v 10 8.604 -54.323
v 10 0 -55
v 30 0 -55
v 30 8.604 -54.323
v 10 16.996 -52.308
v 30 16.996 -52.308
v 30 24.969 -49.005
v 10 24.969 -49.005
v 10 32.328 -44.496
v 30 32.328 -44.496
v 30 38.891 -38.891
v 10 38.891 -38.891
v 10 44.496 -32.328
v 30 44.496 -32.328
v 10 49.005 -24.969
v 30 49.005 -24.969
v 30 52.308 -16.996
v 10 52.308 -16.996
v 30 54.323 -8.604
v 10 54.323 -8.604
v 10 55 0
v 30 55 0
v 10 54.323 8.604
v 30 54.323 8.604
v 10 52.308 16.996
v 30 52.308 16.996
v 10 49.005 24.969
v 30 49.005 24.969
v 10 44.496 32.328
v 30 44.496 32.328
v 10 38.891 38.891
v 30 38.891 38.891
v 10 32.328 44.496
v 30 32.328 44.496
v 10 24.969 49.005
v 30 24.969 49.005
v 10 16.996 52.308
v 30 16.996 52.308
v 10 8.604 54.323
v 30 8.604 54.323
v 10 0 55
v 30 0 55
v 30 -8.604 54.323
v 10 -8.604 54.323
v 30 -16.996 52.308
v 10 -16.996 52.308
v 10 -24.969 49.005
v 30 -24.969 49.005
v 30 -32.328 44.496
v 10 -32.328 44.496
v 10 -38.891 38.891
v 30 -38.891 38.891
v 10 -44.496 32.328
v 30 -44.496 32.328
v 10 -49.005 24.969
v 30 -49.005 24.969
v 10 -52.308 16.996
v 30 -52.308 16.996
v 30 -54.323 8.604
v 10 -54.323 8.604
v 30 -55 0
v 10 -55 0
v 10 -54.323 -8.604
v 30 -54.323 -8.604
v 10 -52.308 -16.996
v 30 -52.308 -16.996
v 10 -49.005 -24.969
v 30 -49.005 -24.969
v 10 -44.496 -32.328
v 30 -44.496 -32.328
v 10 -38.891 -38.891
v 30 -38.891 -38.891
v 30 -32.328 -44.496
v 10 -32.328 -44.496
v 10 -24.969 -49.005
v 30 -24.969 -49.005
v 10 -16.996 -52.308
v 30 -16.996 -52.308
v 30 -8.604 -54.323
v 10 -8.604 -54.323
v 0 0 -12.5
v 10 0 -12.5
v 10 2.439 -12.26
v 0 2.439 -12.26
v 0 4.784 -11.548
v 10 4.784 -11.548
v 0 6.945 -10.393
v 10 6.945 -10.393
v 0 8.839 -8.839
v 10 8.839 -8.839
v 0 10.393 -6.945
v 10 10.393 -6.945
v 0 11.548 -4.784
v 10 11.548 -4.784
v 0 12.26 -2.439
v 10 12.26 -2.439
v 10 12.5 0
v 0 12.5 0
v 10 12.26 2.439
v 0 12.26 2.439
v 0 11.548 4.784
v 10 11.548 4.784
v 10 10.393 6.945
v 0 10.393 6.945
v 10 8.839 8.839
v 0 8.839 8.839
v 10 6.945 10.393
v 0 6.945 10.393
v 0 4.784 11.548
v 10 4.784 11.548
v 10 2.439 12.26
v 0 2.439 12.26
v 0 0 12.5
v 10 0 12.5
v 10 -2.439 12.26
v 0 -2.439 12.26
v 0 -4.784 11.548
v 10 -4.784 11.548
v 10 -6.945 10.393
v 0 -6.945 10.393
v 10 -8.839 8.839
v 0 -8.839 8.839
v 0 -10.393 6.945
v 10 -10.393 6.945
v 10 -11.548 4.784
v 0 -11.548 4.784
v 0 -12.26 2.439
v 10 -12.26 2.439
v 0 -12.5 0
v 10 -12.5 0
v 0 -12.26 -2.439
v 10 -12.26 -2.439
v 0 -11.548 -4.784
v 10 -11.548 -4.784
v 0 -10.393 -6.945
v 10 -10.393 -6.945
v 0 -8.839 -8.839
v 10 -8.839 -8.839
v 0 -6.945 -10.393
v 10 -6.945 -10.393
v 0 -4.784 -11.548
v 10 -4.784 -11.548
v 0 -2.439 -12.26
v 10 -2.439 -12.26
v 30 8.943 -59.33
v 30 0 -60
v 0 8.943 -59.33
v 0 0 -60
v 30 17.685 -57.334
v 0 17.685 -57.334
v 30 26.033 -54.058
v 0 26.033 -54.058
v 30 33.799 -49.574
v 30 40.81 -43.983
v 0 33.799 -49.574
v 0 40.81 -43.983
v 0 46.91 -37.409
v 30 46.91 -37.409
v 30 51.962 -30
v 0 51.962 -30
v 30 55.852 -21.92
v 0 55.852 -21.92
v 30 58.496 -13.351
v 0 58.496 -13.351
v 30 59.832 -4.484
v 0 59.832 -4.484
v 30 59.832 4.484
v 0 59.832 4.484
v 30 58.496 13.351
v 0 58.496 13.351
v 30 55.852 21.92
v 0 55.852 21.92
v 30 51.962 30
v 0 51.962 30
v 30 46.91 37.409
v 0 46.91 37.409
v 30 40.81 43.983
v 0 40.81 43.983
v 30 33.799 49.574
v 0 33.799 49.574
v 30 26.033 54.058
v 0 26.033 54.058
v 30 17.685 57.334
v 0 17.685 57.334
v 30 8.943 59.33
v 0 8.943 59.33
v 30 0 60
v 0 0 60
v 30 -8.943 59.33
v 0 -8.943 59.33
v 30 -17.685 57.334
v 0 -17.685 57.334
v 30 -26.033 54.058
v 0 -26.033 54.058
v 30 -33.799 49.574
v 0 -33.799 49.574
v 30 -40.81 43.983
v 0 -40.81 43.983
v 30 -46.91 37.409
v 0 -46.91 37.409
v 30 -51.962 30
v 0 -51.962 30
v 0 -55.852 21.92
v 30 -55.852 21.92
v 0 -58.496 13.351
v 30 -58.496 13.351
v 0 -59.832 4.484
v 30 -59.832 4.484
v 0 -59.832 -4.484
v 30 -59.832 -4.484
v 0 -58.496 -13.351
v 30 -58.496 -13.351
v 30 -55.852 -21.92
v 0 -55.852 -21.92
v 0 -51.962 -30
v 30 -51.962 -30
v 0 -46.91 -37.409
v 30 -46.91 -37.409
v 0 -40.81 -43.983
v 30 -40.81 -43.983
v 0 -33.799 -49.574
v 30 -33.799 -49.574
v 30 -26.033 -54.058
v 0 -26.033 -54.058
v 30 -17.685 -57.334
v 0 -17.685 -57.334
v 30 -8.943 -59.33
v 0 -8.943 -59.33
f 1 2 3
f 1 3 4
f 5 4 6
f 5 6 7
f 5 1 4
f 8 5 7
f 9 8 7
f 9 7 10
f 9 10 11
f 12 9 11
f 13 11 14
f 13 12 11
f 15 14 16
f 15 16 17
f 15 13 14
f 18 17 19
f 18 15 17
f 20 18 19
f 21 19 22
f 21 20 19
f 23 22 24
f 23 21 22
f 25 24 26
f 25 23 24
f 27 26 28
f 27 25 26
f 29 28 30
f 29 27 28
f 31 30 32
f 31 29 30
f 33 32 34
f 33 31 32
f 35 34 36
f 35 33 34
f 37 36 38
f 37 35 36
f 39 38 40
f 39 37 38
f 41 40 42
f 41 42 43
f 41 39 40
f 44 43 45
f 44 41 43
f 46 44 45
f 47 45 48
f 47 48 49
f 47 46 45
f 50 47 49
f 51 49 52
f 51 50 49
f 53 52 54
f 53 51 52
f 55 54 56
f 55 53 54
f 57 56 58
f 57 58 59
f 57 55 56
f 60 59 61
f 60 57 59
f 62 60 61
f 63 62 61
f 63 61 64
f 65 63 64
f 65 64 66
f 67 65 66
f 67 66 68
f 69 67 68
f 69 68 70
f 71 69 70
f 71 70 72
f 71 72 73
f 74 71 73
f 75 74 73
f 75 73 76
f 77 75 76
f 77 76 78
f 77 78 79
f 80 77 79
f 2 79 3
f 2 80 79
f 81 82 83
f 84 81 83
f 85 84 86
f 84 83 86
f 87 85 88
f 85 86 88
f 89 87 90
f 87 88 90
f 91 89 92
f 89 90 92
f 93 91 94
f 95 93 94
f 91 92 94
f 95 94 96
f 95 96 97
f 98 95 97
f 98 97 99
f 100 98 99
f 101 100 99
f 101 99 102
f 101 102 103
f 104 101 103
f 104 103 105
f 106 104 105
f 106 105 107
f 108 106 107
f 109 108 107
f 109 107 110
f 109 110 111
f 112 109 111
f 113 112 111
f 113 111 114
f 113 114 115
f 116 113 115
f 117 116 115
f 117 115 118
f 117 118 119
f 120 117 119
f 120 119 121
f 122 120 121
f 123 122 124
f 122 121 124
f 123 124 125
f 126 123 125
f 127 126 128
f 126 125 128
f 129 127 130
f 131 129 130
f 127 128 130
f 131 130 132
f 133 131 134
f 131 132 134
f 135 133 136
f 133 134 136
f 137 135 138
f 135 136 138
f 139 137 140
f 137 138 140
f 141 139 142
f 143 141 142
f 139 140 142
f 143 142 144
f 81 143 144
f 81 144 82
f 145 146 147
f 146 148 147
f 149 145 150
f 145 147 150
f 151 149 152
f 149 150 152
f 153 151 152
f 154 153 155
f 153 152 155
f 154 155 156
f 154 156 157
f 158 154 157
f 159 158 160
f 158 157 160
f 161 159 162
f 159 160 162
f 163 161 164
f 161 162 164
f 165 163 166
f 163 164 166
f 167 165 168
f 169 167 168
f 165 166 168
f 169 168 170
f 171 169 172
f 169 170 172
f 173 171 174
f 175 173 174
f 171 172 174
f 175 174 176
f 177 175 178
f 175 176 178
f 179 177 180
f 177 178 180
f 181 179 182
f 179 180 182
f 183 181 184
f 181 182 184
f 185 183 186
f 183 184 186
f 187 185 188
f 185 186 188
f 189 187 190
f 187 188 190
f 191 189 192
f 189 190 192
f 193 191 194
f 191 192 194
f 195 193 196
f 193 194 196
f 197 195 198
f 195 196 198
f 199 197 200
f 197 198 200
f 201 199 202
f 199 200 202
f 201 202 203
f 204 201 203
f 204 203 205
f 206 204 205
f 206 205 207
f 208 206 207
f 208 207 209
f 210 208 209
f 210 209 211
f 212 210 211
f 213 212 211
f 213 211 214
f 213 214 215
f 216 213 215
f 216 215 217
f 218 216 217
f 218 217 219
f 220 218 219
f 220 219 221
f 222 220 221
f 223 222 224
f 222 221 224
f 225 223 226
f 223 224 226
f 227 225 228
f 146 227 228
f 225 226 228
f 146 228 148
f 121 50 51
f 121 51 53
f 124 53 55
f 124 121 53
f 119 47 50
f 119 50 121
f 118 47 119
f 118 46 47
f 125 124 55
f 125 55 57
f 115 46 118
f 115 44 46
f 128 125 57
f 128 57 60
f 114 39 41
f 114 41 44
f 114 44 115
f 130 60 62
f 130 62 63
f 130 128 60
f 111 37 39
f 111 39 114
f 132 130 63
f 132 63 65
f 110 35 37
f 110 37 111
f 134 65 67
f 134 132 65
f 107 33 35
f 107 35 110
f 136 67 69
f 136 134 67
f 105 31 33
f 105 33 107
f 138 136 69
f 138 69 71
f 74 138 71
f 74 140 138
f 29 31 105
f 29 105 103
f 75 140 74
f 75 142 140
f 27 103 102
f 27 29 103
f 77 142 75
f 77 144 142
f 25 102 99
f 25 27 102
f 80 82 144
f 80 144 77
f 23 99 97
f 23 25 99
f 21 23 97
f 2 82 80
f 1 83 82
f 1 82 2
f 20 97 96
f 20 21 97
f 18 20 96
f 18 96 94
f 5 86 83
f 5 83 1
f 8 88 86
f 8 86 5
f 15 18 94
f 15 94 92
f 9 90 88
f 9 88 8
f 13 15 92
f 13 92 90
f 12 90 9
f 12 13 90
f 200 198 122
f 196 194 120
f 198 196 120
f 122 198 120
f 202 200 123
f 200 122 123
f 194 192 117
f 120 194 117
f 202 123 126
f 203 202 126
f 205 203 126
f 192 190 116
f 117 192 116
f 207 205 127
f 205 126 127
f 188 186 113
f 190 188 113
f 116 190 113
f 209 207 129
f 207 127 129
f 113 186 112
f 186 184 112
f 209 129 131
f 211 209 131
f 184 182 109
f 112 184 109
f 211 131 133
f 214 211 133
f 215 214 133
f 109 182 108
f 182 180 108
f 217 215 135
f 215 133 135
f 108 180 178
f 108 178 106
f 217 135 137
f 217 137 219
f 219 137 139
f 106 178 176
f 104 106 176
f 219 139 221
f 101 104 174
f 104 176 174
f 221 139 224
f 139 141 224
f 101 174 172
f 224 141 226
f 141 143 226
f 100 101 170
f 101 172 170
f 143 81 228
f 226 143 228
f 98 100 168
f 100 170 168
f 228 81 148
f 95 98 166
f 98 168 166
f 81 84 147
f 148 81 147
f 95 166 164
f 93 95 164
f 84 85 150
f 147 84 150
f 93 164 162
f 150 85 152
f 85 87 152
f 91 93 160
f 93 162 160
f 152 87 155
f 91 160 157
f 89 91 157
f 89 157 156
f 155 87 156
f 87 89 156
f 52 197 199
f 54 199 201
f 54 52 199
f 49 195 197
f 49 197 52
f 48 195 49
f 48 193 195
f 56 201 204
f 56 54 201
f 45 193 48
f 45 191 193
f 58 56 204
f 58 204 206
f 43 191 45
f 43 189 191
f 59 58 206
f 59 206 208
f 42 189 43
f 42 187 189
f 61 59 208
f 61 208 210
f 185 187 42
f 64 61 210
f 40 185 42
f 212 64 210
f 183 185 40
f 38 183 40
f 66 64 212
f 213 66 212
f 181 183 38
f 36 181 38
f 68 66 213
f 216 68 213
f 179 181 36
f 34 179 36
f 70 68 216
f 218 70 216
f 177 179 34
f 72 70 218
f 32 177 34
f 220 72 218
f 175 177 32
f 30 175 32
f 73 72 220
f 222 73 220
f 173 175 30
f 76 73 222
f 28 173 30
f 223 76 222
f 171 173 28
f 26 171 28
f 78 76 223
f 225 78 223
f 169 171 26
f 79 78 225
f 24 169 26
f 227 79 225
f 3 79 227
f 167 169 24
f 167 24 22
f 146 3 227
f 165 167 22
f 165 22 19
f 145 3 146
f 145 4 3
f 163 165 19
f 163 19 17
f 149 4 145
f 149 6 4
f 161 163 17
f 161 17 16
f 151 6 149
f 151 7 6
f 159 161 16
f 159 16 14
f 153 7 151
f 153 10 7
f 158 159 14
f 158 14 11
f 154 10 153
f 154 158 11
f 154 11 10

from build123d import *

# Parameters (mm, degrees)
SKETCH1_R           = 60
BOSS_EXTRUDE1_DEPTH = 10
SKETCH2_R           = 60
SKETCH2_R_2         = 55
BOSS_EXTRUDE2_DEPTH = 20
SKETCH3_R           = 12.5
CUT_EXTRUDE1_DEPTH  = 11


with BuildPart() as part:
    # Sketch1 → Boss-Extrude1 (new body)
    with BuildSketch(Plane(origin=(0, 0, 0), x_dir=(0, 0, -1), z_dir=(1, 0, 0))):
        Circle(SKETCH1_R)
    extrude(amount=BOSS_EXTRUDE1_DEPTH)

    # Sketch2 → Boss-Extrude2 (add)
    with BuildSketch(Plane(origin=(10, 0, 0), x_dir=(0, 0, -1), z_dir=(1, 0, 0))):
        Circle(SKETCH2_R)
        Circle(SKETCH2_R_2, mode=Mode.SUBTRACT)
    extrude(amount=BOSS_EXTRUDE2_DEPTH)

    # Sketch3 → Cut-Extrude1 (cut, through all)
    with BuildSketch(Plane(origin=(10, 0, 0), x_dir=(0, 0, -1), z_dir=(1, 0, 0))):
        Circle(SKETCH3_R)
    extrude(amount=-CUT_EXTRUDE1_DEPTH, mode=Mode.SUBTRACT)


solid = part.part
